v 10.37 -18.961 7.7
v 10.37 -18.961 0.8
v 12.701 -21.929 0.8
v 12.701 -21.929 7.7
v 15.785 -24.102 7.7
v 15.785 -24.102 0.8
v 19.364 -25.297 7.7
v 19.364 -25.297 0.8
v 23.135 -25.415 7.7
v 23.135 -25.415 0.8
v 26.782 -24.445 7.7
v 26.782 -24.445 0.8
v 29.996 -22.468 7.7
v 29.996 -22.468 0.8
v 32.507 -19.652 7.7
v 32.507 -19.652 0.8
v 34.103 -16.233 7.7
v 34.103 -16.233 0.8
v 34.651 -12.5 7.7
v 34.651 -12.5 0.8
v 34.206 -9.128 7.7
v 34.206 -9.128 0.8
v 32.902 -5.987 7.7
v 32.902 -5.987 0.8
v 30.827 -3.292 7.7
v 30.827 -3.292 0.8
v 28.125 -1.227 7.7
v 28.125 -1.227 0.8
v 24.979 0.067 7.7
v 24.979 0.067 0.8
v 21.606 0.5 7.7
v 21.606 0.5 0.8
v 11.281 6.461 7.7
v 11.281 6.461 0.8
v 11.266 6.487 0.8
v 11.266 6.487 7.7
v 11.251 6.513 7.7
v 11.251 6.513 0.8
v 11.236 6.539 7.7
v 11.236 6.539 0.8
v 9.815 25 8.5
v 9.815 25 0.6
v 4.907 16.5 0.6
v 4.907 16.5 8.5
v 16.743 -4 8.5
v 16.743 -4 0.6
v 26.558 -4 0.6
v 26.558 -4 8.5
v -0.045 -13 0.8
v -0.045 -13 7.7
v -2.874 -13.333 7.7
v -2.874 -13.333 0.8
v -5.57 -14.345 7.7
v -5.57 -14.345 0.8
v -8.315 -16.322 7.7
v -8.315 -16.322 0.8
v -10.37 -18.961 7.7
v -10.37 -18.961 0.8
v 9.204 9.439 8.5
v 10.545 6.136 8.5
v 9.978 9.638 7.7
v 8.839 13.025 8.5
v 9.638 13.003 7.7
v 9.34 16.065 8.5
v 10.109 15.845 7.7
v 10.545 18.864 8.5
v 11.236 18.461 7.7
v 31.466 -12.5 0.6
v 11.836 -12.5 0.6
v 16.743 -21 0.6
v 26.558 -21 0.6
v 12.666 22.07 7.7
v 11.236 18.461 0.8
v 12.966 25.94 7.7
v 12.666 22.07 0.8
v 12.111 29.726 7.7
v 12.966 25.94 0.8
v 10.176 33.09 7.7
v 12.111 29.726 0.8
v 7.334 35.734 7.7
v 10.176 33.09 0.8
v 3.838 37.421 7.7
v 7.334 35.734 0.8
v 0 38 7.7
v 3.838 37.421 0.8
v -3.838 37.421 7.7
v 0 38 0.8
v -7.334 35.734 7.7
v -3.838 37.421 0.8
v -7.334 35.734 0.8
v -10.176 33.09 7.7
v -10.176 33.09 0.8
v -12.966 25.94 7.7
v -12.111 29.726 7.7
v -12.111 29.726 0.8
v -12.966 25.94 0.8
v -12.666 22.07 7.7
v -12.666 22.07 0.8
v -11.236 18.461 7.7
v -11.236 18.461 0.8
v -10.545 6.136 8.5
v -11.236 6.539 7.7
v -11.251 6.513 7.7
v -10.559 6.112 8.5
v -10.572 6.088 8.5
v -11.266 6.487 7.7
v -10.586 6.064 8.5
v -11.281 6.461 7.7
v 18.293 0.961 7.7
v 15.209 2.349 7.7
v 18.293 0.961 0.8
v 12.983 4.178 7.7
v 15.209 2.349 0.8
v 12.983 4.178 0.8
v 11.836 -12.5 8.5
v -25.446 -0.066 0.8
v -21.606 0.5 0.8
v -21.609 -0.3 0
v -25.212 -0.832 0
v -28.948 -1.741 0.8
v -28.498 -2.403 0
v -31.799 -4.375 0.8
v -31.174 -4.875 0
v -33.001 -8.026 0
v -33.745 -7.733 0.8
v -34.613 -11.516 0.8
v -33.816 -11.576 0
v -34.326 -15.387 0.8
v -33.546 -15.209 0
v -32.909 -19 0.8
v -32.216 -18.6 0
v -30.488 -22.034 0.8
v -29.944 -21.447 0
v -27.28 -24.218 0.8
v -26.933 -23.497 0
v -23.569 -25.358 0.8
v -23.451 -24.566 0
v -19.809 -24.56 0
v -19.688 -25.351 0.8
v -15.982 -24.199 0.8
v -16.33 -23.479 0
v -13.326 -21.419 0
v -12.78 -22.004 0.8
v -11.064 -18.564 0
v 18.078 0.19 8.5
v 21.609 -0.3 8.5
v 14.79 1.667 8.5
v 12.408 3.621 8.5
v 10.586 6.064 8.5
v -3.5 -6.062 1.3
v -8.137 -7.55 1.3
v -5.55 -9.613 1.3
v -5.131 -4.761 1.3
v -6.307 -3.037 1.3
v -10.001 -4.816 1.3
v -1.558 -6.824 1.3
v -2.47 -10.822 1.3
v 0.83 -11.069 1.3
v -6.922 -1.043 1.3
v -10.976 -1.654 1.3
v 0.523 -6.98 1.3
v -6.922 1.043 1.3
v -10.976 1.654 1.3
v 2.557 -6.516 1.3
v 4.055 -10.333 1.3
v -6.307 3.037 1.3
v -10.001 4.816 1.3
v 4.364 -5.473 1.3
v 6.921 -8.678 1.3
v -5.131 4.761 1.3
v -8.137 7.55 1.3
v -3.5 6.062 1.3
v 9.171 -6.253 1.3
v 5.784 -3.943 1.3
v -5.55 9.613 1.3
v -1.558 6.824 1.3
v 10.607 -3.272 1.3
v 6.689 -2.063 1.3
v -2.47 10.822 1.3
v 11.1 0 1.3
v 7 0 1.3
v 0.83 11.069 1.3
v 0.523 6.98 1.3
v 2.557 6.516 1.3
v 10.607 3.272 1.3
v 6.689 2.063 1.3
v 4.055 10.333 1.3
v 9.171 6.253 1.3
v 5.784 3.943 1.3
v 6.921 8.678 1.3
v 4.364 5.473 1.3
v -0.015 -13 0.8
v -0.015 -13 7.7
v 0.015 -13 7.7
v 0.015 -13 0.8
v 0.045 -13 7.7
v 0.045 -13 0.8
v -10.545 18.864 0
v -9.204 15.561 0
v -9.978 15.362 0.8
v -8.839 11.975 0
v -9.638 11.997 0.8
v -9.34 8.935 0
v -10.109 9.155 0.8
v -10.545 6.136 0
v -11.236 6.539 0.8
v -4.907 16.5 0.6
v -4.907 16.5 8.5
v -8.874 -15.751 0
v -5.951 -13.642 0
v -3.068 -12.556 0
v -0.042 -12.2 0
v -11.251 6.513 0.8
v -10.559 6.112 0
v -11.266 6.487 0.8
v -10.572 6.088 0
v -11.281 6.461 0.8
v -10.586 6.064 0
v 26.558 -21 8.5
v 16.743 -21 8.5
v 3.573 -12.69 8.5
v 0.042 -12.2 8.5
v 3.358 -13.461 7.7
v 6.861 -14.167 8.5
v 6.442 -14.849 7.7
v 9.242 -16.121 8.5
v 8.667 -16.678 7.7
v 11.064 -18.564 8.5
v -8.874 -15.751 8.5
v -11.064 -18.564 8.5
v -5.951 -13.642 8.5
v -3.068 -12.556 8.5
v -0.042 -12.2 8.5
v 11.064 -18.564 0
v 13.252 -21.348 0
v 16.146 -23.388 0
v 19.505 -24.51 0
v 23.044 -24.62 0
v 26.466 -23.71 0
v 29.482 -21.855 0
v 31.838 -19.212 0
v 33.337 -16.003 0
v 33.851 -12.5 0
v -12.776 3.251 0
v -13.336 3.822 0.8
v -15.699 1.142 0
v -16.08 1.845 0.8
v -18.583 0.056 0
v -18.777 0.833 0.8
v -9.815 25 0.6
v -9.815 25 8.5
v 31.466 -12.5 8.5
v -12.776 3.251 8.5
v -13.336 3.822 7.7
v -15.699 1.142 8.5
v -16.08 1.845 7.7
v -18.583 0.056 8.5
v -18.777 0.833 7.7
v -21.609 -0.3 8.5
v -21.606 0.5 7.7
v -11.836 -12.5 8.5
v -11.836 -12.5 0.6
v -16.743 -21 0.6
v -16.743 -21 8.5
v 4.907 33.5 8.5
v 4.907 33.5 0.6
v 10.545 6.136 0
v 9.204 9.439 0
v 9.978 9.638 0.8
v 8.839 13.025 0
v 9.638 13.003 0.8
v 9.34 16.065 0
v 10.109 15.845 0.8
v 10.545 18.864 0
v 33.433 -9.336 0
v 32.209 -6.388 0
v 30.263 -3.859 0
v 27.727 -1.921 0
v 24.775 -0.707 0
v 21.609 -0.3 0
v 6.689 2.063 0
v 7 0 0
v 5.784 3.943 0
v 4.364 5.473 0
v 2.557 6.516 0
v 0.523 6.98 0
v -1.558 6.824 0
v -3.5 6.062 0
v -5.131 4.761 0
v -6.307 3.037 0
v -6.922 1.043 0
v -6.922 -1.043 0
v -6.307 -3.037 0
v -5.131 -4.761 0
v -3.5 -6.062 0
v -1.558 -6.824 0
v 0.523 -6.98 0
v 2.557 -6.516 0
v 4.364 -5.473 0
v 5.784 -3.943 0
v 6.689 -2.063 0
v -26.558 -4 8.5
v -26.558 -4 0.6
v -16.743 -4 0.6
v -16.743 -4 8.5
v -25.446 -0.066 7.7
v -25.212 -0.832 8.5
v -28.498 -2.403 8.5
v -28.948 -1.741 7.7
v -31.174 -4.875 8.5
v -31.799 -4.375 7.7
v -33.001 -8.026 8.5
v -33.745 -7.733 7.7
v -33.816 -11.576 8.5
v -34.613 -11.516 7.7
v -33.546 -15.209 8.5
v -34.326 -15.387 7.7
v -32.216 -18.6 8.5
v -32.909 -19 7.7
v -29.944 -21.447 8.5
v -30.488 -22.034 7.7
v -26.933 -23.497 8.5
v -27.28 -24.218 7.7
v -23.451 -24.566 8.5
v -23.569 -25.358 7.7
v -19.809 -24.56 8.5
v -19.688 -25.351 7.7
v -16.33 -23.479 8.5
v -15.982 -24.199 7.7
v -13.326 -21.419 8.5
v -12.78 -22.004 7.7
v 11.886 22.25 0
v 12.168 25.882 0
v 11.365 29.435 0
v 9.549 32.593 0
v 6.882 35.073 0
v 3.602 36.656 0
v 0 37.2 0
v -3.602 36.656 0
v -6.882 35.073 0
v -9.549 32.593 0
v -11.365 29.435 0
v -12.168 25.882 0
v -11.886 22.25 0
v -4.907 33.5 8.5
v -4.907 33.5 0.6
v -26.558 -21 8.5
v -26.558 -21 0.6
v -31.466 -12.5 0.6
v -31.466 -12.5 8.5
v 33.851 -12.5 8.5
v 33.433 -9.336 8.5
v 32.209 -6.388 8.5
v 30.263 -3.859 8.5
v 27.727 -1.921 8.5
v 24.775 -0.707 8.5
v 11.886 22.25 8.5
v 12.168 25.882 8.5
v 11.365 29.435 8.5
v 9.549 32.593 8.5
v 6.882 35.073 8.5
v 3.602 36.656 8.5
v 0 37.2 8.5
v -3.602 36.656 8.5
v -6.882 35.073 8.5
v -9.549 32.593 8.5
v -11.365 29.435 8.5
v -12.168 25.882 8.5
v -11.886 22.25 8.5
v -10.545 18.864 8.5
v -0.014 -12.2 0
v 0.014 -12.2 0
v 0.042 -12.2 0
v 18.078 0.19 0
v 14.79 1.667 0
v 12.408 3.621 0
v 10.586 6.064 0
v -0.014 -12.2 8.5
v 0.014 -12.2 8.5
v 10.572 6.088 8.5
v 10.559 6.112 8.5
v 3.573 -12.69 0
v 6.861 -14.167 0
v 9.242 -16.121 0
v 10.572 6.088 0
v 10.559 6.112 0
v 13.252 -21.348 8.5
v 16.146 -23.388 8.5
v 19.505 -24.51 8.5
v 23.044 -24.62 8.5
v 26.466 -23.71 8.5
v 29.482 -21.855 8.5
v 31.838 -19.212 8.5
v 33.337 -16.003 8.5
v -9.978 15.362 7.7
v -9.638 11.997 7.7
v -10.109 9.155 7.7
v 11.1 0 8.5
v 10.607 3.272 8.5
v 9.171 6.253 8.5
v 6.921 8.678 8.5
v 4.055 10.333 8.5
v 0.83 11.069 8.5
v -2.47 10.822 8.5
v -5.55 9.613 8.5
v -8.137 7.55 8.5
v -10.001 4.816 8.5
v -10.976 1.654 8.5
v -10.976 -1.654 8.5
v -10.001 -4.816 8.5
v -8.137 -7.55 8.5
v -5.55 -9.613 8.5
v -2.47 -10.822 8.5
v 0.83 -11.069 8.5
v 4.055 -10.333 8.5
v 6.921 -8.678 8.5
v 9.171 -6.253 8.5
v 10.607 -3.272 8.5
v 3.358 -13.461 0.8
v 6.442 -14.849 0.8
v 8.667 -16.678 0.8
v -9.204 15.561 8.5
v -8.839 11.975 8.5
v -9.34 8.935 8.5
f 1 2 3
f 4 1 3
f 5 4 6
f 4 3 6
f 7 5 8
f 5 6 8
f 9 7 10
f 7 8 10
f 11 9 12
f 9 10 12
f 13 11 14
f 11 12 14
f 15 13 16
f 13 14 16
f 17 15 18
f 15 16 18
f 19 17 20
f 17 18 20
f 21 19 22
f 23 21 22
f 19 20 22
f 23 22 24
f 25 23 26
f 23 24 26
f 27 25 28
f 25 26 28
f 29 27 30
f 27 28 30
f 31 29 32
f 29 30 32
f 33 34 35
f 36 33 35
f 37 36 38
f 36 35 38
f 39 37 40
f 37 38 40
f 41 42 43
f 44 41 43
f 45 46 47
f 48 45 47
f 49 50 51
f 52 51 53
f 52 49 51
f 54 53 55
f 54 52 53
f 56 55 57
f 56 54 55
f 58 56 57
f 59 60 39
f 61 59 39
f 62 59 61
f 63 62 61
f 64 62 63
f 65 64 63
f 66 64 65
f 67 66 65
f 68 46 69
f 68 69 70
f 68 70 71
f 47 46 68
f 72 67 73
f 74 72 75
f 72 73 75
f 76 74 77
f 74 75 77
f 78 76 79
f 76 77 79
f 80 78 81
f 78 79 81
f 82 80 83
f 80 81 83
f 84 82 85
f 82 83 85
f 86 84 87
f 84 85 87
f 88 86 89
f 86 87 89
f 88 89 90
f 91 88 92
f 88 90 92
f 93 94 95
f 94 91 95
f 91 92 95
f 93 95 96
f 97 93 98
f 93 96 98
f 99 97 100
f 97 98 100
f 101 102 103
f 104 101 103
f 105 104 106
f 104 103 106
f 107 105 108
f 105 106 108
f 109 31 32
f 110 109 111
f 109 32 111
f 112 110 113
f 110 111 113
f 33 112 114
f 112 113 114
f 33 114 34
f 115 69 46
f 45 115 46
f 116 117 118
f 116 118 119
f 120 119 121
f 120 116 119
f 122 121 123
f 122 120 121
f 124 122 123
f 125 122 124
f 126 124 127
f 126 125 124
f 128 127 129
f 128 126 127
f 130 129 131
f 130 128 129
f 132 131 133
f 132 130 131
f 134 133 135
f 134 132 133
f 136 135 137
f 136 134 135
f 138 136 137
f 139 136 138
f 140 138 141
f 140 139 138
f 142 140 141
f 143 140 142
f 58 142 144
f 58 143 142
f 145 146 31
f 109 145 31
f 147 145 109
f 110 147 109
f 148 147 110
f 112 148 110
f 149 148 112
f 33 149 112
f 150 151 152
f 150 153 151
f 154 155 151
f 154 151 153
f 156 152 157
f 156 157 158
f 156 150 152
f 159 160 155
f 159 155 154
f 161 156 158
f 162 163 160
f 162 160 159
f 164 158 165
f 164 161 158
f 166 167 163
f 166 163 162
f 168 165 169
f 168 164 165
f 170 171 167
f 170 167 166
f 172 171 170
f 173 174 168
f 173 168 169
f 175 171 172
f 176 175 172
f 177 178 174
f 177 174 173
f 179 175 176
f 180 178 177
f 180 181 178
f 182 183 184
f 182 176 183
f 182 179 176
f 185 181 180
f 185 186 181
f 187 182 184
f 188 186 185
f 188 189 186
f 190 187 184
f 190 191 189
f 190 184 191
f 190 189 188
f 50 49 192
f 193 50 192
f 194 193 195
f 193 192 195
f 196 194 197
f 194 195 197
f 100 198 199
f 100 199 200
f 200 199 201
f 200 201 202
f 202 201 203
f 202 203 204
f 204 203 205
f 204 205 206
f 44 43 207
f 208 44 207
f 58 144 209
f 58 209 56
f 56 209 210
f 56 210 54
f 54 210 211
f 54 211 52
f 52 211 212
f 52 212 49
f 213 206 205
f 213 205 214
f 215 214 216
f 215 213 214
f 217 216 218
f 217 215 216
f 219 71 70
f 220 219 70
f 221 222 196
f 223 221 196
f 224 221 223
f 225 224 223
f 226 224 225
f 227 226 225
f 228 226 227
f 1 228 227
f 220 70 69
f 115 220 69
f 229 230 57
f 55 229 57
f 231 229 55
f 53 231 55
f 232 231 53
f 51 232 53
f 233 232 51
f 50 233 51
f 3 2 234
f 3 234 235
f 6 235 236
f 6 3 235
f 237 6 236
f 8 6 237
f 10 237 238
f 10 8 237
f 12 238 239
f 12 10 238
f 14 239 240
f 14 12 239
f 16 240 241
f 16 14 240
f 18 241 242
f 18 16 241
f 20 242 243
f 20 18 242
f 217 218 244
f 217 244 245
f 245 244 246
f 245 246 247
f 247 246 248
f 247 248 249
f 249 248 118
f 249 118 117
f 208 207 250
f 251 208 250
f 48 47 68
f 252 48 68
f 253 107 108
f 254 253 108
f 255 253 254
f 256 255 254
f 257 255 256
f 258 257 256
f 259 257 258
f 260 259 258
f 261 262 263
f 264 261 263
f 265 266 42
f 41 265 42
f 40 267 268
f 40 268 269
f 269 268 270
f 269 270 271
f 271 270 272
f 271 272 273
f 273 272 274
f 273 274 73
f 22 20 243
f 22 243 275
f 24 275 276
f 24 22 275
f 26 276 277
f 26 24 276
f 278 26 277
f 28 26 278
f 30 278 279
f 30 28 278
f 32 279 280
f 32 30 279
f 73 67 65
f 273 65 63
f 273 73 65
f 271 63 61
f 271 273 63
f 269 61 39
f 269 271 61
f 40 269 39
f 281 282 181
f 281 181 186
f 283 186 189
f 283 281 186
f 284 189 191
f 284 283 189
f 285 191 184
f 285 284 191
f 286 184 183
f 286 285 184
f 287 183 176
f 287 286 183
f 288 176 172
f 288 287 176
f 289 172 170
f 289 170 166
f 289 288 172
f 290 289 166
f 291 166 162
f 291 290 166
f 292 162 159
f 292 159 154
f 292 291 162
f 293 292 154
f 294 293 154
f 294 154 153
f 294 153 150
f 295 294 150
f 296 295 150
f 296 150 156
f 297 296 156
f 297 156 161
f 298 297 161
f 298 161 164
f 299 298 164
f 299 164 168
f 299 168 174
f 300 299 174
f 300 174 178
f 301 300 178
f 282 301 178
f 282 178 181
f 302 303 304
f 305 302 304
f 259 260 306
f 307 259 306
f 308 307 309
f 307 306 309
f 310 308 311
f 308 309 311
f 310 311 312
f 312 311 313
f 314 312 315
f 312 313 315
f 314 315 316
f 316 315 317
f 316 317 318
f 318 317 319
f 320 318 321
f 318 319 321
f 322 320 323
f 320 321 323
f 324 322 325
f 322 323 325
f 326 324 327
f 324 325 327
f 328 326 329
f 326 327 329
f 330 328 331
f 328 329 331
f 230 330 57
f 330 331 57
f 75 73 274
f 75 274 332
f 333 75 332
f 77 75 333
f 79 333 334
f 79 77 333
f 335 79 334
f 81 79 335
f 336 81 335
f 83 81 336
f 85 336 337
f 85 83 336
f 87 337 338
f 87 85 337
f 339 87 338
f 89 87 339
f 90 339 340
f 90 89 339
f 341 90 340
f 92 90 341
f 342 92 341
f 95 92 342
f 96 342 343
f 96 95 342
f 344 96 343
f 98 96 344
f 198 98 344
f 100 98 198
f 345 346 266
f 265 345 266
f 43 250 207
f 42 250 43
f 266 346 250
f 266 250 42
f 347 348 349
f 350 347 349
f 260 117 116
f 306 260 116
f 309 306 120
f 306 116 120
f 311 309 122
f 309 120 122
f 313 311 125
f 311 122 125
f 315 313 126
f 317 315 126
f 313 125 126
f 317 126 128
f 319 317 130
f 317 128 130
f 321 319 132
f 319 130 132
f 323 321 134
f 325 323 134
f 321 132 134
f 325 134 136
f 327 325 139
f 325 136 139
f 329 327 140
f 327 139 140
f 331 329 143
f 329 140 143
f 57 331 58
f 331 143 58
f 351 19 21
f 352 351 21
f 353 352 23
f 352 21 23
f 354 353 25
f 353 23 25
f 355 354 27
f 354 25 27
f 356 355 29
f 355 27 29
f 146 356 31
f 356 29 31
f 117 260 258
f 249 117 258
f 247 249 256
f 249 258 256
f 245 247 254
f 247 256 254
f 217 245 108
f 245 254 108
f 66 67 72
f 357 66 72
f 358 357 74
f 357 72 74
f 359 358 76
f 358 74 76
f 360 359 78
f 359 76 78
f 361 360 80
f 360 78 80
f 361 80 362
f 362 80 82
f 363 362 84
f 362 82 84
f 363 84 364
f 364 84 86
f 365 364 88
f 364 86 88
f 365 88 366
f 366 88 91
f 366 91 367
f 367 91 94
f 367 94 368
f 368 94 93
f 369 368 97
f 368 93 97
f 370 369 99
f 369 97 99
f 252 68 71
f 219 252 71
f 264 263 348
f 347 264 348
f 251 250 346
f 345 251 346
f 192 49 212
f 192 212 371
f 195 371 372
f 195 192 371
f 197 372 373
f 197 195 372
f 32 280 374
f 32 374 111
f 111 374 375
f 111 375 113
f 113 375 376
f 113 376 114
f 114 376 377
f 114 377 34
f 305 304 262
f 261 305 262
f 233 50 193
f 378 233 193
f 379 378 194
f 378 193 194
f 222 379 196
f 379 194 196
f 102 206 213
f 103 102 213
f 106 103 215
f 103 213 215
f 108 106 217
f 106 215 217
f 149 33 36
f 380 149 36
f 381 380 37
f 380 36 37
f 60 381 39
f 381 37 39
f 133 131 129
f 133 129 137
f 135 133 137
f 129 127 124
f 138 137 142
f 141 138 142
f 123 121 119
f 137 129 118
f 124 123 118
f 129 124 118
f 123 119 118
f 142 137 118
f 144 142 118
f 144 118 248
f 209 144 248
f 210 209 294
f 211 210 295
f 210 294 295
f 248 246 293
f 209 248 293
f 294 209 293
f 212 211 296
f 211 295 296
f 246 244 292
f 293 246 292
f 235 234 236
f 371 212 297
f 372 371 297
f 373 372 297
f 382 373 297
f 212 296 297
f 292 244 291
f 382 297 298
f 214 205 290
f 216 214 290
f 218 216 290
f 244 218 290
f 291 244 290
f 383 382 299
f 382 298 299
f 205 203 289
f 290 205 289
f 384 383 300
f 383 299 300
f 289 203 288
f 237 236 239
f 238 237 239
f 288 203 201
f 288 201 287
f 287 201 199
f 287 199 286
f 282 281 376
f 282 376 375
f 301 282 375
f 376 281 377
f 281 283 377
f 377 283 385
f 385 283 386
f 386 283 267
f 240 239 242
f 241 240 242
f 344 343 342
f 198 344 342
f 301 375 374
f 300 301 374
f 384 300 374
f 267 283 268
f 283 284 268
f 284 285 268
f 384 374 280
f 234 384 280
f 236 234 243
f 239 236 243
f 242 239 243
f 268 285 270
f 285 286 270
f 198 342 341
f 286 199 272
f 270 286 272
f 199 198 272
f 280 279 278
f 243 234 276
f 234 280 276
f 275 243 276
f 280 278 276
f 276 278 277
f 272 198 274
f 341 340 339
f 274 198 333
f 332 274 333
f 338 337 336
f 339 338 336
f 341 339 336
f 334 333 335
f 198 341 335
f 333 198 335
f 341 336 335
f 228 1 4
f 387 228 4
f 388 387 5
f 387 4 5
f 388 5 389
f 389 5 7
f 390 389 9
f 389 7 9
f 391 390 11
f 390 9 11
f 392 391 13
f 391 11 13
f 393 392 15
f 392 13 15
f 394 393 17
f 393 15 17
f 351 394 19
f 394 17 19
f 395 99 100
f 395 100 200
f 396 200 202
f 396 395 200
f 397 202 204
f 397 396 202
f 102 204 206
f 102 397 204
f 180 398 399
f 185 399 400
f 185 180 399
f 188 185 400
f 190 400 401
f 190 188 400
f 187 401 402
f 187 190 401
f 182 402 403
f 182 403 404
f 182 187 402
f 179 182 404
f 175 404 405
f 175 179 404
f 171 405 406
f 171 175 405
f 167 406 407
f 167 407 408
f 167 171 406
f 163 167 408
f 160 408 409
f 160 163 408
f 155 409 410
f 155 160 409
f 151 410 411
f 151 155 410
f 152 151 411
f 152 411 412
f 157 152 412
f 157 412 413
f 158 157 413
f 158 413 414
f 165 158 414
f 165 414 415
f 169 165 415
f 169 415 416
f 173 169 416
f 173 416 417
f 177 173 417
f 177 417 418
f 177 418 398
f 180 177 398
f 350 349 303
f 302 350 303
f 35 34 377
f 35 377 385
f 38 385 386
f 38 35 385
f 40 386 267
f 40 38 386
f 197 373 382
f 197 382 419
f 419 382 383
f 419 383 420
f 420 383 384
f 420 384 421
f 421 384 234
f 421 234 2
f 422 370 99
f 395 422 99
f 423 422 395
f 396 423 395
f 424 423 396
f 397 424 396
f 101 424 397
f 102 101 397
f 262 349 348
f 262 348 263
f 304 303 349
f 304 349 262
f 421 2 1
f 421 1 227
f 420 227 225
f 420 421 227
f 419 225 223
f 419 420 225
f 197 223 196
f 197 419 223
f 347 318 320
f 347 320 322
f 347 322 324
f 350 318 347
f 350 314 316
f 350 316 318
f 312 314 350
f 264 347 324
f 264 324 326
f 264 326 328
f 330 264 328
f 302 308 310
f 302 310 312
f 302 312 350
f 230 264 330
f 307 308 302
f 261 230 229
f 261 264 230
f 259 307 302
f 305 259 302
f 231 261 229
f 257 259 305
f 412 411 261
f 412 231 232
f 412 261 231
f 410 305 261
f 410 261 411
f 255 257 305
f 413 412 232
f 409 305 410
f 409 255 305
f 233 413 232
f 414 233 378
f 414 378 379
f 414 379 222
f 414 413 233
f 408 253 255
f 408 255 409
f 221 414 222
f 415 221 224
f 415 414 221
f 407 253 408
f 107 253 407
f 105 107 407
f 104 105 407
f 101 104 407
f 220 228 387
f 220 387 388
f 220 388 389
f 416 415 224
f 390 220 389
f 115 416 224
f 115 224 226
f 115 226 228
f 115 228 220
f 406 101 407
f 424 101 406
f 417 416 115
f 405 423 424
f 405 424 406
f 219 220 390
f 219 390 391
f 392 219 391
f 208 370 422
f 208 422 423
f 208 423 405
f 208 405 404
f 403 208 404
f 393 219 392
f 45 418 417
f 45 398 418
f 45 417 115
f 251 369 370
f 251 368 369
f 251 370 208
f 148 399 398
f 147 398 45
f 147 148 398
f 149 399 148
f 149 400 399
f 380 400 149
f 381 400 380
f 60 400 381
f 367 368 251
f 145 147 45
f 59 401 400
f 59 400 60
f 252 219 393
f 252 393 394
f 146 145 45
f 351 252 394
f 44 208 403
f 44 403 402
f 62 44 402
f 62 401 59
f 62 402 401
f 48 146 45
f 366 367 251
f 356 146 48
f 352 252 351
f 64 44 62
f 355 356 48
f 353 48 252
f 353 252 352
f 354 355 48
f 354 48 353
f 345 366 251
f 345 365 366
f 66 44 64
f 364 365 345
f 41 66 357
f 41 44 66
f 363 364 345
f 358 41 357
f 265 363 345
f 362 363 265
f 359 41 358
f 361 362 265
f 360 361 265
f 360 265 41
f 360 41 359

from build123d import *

# Parameters (mm, degrees)
F0_R     = 11.1
F0_R_2   = 7
F1_DEPTH = 0.6
F2_DEPTH = 8.5
F3_R     = 11.8527911282
F4_SIZE  = 0.8
F5_DEPTH = 1.3


# Not quite as in the source:
# - a feature names something its author has since deleted; it is built from what else it names


with BuildPart() as f1:
    # F0 (on Top) → F1 (new body)
    with BuildSketch(Plane.XY):
        with BuildLine():
            ThreePointArc((-3.5707142143, 12.5), (0, 13), (3.5707142143, 12.5))
            ThreePointArc((3.5707142143, 12.5), (10.3783256064, 17.1711841504), (13, 25))
            ThreePointArc((13, 25), (-7.8288158496, 35.3783256064), (-3.5707142143, 12.5))
        make_face()
        Polygon((4.9074772881, 33.5), (9.8149545762, 25), (4.9074772881, 16.5), (-4.9074772881, 16.5), (-9.8149545762, 25), (-4.9074772881, 33.5), align=None, mode=Mode.SUBTRACT)
        with BuildLine():
            ThreePointArc((-9.0399604402, -9.3423292192), (-11.2583302492, -6.5), (-12.6106746544, -3.1576707808))
            ThreePointArc((-12.6106746544, -3.1576707808), (-33.6197513051, -17.5734856991), (-8.6506350946, -12.5))
            ThreePointArc((-8.6506350946, -12.5), (-8.7483335459, -10.9092093959), (-9.0399604402, -9.3423292192))
        make_face()
        Polygon((-26.5581123827, -4), (-16.7431578065, -4), (-11.8356805184, -12.5), (-16.7431578065, -21), (-26.5581123827, -21), (-31.4655896708, -12.5), align=None, mode=Mode.SUBTRACT)
        with BuildLine():
            ThreePointArc((34.6506350946, -12.5), (26.7241207937, -0.5308837895), (12.6106746544, -3.1576707808))
            ThreePointArc((12.6106746544, -3.1576707808), (11.2583302492, -6.5), (9.0399604402, -9.3423292192))
            ThreePointArc((9.0399604402, -9.3423292192), (20.0598444905, -25.4023015487), (34.6506350946, -12.5))
        make_face()
        Polygon((16.7431578065, -21), (11.8356805184, -12.5), (16.7431578065, -4), (26.5581123827, -4), (31.4655896708, -12.5), (26.5581123827, -21), align=None, mode=Mode.SUBTRACT)
        with BuildLine():
            ThreePointArc((12.6106746544, -3.1576707808), (12.9023015487, -1.5907906041), (13, 0))
            ThreePointArc((13, 0), (10.3783256064, 7.8288158496), (3.5707142143, 12.5))
            ThreePointArc((3.5707142143, 12.5), (0, 12), (-3.5707142143, 12.5))
            ThreePointArc((-3.5707142143, 12.5), (-11.2583302492, 6.5), (-12.6106746544, -3.1576707808))
            ThreePointArc((-12.6106746544, -3.1576707808), (-10.3923048454, -6), (-9.0399604402, -9.3423292192))
            ThreePointArc((-9.0399604402, -9.3423292192), (0, -13), (9.0399604402, -9.3423292192))
            ThreePointArc((9.0399604402, -9.3423292192), (10.3923048454, -6), (12.6106746544, -3.1576707808))
        make_face()
        Circle(F0_R, mode=Mode.SUBTRACT)
        Circle(F0_R)
        Circle(F0_R_2, mode=Mode.SUBTRACT)
        Polygon((4.9074772881, 16.5), (9.8149545762, 25), (4.9074772881, 33.5), (-4.9074772881, 33.5), (-9.8149545762, 25), (-4.9074772881, 16.5), align=None)
        Polygon((-11.8356805184, -12.5), (-16.7431578065, -4), (-26.5581123827, -4), (-31.4655896708, -12.5), (-26.5581123827, -21), (-16.7431578065, -21), align=None)
        Polygon((16.7431578065, -4), (11.8356805184, -12.5), (16.7431578065, -21), (26.5581123827, -21), (31.4655896708, -12.5), (26.5581123827, -4), align=None)
        with BuildLine():
            ThreePointArc((-3.5707142143, 12.5), (0, 12), (3.5707142143, 12.5))
            ThreePointArc((3.5707142143, 12.5), (0, 13), (-3.5707142143, 12.5))
        make_face()
        with BuildLine():
            ThreePointArc((-9.0399604402, -9.3423292192), (-10.3923048454, -6), (-12.6106746544, -3.1576707808))
            ThreePointArc((-12.6106746544, -3.1576707808), (-11.2583302492, -6.5), (-9.0399604402, -9.3423292192))
        make_face()
        with BuildLine():
            ThreePointArc((9.0399604402, -9.3423292192), (11.2583302492, -6.5), (12.6106746544, -3.1576707808))
            ThreePointArc((12.6106746544, -3.1576707808), (10.3923048454, -6), (9.0399604402, -9.3423292192))
        make_face()
    extrude(amount=F1_DEPTH)

    # F0 (on Top) → F2 (join)
    with BuildSketch(Plane.XY):
        with BuildLine():
            ThreePointArc((-3.5707142143, 12.5), (0, 13), (3.5707142143, 12.5))
            ThreePointArc((3.5707142143, 12.5), (10.3783256064, 17.1711841504), (13, 25))
            ThreePointArc((13, 25), (-7.8288158496, 35.3783256064), (-3.5707142143, 12.5))
        make_face()
        Polygon((4.9074772881, 33.5), (9.8149545762, 25), (4.9074772881, 16.5), (-4.9074772881, 16.5), (-9.8149545762, 25), (-4.9074772881, 33.5), align=None, mode=Mode.SUBTRACT)
        with BuildLine():
            ThreePointArc((12.6106746544, -3.1576707808), (12.9023015487, -1.5907906041), (13, 0))
            ThreePointArc((13, 0), (10.3783256064, 7.8288158496), (3.5707142143, 12.5))
            ThreePointArc((3.5707142143, 12.5), (0, 12), (-3.5707142143, 12.5))
            ThreePointArc((-3.5707142143, 12.5), (-11.2583302492, 6.5), (-12.6106746544, -3.1576707808))
            ThreePointArc((-12.6106746544, -3.1576707808), (-10.3923048454, -6), (-9.0399604402, -9.3423292192))
            ThreePointArc((-9.0399604402, -9.3423292192), (0, -13), (9.0399604402, -9.3423292192))
            ThreePointArc((9.0399604402, -9.3423292192), (10.3923048454, -6), (12.6106746544, -3.1576707808))
        make_face()
        Circle(F0_R, mode=Mode.SUBTRACT)
        with BuildLine():
            ThreePointArc((-3.5707142143, 12.5), (0, 12), (3.5707142143, 12.5))
            ThreePointArc((3.5707142143, 12.5), (0, 13), (-3.5707142143, 12.5))
        make_face()
        with BuildLine():
            ThreePointArc((-9.0399604402, -9.3423292192), (-11.2583302492, -6.5), (-12.6106746544, -3.1576707808))
            ThreePointArc((-12.6106746544, -3.1576707808), (-33.6197513051, -17.5734856991), (-8.6506350946, -12.5))
            ThreePointArc((-8.6506350946, -12.5), (-8.7483335459, -10.9092093959), (-9.0399604402, -9.3423292192))
        make_face()
        Polygon((-26.5581123827, -4), (-16.7431578065, -4), (-11.8356805184, -12.5), (-16.7431578065, -21), (-26.5581123827, -21), (-31.4655896708, -12.5), align=None, mode=Mode.SUBTRACT)
        with BuildLine():
            ThreePointArc((-9.0399604402, -9.3423292192), (-10.3923048454, -6), (-12.6106746544, -3.1576707808))
            ThreePointArc((-12.6106746544, -3.1576707808), (-11.2583302492, -6.5), (-9.0399604402, -9.3423292192))
        make_face()
        with BuildLine():
            ThreePointArc((34.6506350946, -12.5), (26.7241207937, -0.5308837895), (12.6106746544, -3.1576707808))
            ThreePointArc((12.6106746544, -3.1576707808), (11.2583302492, -6.5), (9.0399604402, -9.3423292192))
            ThreePointArc((9.0399604402, -9.3423292192), (20.0598444905, -25.4023015487), (34.6506350946, -12.5))
        make_face()
        Polygon((16.7431578065, -21), (11.8356805184, -12.5), (16.7431578065, -4), (26.5581123827, -4), (31.4655896708, -12.5), (26.5581123827, -21), align=None, mode=Mode.SUBTRACT)
        with BuildLine():
            ThreePointArc((9.0399604402, -9.3423292192), (11.2583302492, -6.5), (12.6106746544, -3.1576707808))
            ThreePointArc((12.6106746544, -3.1576707808), (10.3923048454, -6), (9.0399604402, -9.3423292192))
        make_face()
    extrude(amount=F2_DEPTH)

    # F3
    f3_edges = [f1.edges().sort_by_distance(p)[0] for p in [
        (3.570714, 12.5, 4.25),
        (-3.570714, 12.5, 4.25),
        (-12.610675, -3.157671, 4.25),
        (-9.03996, -9.342329, 4.25),
        (9.03996, -9.342329, 4.25),
        (12.610675, -3.157671, 4.25),
    ]]
    fillet(f3_edges, radius=F3_R)

    # F4
    f4_edges = [f1.edges().sort_by_distance(p)[0] for p in [
        (11.25833, 6.5, 8.5),
        (9.627694, 12.5, 8.5),
        (0, 38, 8.5),
        (-9.627694, 12.5, 8.5),
        (-11.25833, 6.5, 8.5),
        (-11.25833, 6.5, 0),
        (-9.627694, 12.5, 0),
        (0, 38, 0),
        (9.627694, 12.5, 0),
        (11.25833, 6.5, 0),
        (15.639164, 2.087827, 8.5),
        (-15.639164, 2.087827, 8.5),
        (32.908965, -19, 8.5),
        (-32.908965, -19, 8.5),
        (6.011471, -14.587827, 8.5),
        (-6.011471, -14.587827, 8.5),
        (0, -13, 8.5),
        (15.639164, 2.087827, 0),
        (-15.639164, 2.087827, 0),
        (32.908965, -19, 0),
        (-32.908965, -19, 0),
        (6.011471, -14.587827, 0),
        (-6.011471, -14.587827, 0),
        (0, -13, 0),
    ]]
    chamfer(f4_edges, length=F4_SIZE)

    # F0 (on Top) → F5 (join)
    with BuildSketch(Plane.XY):
        Circle(F0_R)
        Circle(F0_R_2, mode=Mode.SUBTRACT)
    extrude(amount=F5_DEPTH)


solid = f1.part
